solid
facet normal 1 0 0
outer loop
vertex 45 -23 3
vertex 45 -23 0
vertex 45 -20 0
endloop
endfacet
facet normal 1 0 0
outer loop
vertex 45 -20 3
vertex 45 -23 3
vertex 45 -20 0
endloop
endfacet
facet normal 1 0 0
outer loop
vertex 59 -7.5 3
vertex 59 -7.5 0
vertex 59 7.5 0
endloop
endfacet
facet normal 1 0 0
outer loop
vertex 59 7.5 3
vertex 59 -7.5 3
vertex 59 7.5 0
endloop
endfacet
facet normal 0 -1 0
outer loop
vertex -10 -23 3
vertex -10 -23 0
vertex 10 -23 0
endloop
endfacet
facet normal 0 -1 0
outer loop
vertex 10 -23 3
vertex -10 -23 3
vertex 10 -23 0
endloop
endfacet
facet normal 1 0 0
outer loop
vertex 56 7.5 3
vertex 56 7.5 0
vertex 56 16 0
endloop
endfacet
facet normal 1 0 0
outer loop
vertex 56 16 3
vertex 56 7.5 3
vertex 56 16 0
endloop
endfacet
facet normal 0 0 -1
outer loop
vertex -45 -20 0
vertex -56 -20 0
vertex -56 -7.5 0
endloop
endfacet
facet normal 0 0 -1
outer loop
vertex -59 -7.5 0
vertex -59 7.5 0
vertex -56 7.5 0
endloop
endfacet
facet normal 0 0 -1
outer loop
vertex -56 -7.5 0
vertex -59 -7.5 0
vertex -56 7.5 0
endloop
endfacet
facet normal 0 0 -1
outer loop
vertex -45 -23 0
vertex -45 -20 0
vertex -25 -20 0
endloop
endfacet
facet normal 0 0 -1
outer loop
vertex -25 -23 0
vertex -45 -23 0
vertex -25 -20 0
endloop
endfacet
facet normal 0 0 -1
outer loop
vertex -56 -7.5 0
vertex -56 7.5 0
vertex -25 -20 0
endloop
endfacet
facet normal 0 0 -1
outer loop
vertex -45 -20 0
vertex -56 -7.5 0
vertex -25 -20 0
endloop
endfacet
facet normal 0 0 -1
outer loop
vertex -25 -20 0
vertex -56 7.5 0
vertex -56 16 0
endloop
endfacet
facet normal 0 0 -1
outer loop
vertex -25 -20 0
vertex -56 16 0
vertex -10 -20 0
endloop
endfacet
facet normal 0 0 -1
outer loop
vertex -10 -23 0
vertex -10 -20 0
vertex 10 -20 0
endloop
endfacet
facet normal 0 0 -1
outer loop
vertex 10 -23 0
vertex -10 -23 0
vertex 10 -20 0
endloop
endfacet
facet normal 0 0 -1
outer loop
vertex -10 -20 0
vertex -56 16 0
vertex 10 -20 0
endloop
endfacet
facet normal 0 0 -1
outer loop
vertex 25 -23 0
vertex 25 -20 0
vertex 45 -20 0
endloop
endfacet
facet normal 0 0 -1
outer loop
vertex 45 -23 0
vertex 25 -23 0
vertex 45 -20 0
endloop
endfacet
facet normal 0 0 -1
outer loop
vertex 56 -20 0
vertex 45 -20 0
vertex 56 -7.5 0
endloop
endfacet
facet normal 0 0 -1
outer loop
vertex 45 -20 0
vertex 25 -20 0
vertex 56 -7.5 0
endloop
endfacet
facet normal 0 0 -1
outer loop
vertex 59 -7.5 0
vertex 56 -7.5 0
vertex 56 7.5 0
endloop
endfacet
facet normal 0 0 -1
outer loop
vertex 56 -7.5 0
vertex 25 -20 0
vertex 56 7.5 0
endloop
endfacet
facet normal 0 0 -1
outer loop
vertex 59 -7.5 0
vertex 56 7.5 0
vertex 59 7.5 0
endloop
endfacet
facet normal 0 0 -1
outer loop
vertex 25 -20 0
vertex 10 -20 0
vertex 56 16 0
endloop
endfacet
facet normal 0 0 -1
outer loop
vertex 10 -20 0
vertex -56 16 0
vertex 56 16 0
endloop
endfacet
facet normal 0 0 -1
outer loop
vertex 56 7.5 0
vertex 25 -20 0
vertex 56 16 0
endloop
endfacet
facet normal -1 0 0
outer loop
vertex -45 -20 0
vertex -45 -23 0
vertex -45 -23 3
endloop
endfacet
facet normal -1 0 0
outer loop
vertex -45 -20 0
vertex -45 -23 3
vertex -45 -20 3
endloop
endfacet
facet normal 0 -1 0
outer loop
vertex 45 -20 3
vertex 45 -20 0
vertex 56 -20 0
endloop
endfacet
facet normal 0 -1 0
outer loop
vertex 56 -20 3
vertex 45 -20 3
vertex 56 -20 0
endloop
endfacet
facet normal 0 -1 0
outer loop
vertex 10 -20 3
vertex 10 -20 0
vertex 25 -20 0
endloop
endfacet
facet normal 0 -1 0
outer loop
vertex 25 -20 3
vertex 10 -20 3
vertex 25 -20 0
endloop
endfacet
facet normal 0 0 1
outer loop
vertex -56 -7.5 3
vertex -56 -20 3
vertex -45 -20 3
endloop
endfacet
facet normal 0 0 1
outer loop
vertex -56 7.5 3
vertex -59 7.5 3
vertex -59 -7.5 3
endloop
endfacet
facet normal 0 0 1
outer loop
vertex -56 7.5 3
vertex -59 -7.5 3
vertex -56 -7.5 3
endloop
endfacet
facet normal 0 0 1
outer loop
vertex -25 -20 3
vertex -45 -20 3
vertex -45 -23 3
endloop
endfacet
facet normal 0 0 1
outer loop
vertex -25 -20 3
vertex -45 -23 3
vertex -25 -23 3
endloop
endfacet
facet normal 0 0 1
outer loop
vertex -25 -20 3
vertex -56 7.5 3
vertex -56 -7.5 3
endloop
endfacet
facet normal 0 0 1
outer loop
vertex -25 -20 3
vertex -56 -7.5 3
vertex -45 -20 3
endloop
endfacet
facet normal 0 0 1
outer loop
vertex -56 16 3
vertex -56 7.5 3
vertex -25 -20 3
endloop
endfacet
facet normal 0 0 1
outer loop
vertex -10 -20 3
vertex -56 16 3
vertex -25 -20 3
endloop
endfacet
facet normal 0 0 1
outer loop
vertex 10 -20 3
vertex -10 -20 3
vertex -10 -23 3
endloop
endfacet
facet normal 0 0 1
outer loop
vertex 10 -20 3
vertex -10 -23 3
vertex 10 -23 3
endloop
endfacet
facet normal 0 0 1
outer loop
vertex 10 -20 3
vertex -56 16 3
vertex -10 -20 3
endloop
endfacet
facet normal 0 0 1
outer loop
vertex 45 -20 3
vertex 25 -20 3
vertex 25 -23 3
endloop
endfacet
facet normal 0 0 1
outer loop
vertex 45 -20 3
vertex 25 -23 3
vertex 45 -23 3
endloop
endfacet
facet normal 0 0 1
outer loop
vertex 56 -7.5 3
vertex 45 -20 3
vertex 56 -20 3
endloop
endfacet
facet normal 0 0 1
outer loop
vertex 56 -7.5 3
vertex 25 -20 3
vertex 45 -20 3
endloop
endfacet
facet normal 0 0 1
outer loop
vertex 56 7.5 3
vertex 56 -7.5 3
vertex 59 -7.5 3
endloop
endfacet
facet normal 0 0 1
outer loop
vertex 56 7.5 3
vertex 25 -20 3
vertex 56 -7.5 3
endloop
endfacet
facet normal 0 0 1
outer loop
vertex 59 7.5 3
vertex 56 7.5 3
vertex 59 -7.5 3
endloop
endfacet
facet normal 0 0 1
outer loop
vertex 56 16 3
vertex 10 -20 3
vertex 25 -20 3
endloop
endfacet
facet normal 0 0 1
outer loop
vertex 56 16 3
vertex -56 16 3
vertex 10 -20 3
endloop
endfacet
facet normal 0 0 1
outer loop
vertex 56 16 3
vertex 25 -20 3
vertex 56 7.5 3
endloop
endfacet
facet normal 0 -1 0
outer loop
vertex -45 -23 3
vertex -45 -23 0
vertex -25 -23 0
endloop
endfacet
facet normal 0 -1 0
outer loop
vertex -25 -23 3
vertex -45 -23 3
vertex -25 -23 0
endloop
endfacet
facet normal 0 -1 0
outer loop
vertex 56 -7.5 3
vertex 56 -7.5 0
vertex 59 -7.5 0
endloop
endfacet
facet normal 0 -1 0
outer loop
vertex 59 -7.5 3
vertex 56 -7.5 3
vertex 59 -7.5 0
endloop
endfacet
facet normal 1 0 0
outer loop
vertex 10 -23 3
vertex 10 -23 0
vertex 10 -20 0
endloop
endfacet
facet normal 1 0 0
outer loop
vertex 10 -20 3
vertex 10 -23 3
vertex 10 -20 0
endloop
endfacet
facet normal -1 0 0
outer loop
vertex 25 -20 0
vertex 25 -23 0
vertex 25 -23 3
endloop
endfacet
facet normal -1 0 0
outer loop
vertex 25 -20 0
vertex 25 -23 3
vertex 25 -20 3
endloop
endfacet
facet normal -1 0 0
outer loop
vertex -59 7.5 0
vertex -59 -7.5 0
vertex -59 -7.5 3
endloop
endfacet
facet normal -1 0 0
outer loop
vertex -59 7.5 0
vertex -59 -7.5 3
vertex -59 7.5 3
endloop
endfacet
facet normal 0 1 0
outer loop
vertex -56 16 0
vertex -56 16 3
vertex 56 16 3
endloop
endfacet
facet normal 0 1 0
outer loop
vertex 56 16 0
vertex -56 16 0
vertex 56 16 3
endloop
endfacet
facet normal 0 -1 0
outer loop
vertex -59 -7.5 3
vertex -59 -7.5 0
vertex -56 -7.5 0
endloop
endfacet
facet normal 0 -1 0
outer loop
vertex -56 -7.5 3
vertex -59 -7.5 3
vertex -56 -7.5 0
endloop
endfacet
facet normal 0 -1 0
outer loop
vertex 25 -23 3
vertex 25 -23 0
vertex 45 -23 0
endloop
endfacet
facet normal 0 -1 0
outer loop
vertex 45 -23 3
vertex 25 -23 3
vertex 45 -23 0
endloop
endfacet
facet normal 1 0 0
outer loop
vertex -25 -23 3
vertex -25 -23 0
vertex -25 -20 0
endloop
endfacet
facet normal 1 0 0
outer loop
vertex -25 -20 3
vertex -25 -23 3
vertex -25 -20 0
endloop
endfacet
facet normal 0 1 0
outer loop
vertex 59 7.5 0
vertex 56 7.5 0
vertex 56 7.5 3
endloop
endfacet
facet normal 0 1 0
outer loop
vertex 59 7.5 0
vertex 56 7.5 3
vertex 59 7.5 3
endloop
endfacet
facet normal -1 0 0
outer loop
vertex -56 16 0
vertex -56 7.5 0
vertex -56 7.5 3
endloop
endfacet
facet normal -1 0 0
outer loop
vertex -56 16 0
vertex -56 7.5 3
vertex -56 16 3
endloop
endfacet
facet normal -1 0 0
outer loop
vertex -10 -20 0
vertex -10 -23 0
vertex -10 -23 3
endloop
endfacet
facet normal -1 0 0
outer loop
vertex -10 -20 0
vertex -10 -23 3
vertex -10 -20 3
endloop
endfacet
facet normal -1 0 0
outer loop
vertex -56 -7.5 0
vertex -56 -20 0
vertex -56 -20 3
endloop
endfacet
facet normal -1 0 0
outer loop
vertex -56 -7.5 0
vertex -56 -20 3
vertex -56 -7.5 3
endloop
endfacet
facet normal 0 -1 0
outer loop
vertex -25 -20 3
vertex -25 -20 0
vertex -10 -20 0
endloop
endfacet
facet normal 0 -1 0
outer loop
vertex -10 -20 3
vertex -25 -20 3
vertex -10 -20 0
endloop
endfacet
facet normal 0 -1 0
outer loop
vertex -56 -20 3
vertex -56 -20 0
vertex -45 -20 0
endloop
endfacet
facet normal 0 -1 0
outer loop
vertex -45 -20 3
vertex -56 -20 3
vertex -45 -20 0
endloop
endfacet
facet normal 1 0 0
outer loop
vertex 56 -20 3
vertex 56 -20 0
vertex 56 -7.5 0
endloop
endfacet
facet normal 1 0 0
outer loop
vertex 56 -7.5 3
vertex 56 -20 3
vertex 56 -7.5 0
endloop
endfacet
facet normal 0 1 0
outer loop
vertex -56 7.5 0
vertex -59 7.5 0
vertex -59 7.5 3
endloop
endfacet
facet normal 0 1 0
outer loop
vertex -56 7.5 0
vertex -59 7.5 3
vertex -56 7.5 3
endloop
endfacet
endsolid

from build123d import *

# Parameters (mm, degrees)
SKETCH1_W           = 3
SKETCH1_H           = 15
SKETCH1_W_2         = 112
SKETCH1_H_2         = 40
SKETCH1_W_3         = 20
SKETCH1_H_3         = 3
BOSS_EXTRUDE1_DEPTH = 3
SKETCH2_W           = 112
SKETCH2_H           = 4
CUT_EXTRUDE1_DEPTH  = 3


with BuildPart() as part:
    # Sketch1 → Boss-Extrude1 (new body)
    with BuildSketch(Plane.XY):
        with Locations((-57.5, 0)):
            Rectangle(SKETCH1_W, SKETCH1_H)
        Rectangle(SKETCH1_W_2, SKETCH1_H_2)
        with Locations((-35, -21.5)):
            Rectangle(SKETCH1_W_3, SKETCH1_H_3)
        with Locations((0, -21.5)):
            Rectangle(SKETCH1_W_3, SKETCH1_H_3)
        with Locations((35, -21.5)):
            Rectangle(SKETCH1_W_3, SKETCH1_H_3)
        with Locations((57.5, 0)):
            Rectangle(SKETCH1_W, SKETCH1_H)
    extrude(amount=BOSS_EXTRUDE1_DEPTH)

    # Sketch2 → Cut-Extrude1 (cut)
    with BuildSketch(Plane.XY.offset(3)):
        with Locations((0, 18)):
            Rectangle(SKETCH2_W, SKETCH2_H)
    extrude(amount=-CUT_EXTRUDE1_DEPTH, mode=Mode.SUBTRACT)


solid = part.part
